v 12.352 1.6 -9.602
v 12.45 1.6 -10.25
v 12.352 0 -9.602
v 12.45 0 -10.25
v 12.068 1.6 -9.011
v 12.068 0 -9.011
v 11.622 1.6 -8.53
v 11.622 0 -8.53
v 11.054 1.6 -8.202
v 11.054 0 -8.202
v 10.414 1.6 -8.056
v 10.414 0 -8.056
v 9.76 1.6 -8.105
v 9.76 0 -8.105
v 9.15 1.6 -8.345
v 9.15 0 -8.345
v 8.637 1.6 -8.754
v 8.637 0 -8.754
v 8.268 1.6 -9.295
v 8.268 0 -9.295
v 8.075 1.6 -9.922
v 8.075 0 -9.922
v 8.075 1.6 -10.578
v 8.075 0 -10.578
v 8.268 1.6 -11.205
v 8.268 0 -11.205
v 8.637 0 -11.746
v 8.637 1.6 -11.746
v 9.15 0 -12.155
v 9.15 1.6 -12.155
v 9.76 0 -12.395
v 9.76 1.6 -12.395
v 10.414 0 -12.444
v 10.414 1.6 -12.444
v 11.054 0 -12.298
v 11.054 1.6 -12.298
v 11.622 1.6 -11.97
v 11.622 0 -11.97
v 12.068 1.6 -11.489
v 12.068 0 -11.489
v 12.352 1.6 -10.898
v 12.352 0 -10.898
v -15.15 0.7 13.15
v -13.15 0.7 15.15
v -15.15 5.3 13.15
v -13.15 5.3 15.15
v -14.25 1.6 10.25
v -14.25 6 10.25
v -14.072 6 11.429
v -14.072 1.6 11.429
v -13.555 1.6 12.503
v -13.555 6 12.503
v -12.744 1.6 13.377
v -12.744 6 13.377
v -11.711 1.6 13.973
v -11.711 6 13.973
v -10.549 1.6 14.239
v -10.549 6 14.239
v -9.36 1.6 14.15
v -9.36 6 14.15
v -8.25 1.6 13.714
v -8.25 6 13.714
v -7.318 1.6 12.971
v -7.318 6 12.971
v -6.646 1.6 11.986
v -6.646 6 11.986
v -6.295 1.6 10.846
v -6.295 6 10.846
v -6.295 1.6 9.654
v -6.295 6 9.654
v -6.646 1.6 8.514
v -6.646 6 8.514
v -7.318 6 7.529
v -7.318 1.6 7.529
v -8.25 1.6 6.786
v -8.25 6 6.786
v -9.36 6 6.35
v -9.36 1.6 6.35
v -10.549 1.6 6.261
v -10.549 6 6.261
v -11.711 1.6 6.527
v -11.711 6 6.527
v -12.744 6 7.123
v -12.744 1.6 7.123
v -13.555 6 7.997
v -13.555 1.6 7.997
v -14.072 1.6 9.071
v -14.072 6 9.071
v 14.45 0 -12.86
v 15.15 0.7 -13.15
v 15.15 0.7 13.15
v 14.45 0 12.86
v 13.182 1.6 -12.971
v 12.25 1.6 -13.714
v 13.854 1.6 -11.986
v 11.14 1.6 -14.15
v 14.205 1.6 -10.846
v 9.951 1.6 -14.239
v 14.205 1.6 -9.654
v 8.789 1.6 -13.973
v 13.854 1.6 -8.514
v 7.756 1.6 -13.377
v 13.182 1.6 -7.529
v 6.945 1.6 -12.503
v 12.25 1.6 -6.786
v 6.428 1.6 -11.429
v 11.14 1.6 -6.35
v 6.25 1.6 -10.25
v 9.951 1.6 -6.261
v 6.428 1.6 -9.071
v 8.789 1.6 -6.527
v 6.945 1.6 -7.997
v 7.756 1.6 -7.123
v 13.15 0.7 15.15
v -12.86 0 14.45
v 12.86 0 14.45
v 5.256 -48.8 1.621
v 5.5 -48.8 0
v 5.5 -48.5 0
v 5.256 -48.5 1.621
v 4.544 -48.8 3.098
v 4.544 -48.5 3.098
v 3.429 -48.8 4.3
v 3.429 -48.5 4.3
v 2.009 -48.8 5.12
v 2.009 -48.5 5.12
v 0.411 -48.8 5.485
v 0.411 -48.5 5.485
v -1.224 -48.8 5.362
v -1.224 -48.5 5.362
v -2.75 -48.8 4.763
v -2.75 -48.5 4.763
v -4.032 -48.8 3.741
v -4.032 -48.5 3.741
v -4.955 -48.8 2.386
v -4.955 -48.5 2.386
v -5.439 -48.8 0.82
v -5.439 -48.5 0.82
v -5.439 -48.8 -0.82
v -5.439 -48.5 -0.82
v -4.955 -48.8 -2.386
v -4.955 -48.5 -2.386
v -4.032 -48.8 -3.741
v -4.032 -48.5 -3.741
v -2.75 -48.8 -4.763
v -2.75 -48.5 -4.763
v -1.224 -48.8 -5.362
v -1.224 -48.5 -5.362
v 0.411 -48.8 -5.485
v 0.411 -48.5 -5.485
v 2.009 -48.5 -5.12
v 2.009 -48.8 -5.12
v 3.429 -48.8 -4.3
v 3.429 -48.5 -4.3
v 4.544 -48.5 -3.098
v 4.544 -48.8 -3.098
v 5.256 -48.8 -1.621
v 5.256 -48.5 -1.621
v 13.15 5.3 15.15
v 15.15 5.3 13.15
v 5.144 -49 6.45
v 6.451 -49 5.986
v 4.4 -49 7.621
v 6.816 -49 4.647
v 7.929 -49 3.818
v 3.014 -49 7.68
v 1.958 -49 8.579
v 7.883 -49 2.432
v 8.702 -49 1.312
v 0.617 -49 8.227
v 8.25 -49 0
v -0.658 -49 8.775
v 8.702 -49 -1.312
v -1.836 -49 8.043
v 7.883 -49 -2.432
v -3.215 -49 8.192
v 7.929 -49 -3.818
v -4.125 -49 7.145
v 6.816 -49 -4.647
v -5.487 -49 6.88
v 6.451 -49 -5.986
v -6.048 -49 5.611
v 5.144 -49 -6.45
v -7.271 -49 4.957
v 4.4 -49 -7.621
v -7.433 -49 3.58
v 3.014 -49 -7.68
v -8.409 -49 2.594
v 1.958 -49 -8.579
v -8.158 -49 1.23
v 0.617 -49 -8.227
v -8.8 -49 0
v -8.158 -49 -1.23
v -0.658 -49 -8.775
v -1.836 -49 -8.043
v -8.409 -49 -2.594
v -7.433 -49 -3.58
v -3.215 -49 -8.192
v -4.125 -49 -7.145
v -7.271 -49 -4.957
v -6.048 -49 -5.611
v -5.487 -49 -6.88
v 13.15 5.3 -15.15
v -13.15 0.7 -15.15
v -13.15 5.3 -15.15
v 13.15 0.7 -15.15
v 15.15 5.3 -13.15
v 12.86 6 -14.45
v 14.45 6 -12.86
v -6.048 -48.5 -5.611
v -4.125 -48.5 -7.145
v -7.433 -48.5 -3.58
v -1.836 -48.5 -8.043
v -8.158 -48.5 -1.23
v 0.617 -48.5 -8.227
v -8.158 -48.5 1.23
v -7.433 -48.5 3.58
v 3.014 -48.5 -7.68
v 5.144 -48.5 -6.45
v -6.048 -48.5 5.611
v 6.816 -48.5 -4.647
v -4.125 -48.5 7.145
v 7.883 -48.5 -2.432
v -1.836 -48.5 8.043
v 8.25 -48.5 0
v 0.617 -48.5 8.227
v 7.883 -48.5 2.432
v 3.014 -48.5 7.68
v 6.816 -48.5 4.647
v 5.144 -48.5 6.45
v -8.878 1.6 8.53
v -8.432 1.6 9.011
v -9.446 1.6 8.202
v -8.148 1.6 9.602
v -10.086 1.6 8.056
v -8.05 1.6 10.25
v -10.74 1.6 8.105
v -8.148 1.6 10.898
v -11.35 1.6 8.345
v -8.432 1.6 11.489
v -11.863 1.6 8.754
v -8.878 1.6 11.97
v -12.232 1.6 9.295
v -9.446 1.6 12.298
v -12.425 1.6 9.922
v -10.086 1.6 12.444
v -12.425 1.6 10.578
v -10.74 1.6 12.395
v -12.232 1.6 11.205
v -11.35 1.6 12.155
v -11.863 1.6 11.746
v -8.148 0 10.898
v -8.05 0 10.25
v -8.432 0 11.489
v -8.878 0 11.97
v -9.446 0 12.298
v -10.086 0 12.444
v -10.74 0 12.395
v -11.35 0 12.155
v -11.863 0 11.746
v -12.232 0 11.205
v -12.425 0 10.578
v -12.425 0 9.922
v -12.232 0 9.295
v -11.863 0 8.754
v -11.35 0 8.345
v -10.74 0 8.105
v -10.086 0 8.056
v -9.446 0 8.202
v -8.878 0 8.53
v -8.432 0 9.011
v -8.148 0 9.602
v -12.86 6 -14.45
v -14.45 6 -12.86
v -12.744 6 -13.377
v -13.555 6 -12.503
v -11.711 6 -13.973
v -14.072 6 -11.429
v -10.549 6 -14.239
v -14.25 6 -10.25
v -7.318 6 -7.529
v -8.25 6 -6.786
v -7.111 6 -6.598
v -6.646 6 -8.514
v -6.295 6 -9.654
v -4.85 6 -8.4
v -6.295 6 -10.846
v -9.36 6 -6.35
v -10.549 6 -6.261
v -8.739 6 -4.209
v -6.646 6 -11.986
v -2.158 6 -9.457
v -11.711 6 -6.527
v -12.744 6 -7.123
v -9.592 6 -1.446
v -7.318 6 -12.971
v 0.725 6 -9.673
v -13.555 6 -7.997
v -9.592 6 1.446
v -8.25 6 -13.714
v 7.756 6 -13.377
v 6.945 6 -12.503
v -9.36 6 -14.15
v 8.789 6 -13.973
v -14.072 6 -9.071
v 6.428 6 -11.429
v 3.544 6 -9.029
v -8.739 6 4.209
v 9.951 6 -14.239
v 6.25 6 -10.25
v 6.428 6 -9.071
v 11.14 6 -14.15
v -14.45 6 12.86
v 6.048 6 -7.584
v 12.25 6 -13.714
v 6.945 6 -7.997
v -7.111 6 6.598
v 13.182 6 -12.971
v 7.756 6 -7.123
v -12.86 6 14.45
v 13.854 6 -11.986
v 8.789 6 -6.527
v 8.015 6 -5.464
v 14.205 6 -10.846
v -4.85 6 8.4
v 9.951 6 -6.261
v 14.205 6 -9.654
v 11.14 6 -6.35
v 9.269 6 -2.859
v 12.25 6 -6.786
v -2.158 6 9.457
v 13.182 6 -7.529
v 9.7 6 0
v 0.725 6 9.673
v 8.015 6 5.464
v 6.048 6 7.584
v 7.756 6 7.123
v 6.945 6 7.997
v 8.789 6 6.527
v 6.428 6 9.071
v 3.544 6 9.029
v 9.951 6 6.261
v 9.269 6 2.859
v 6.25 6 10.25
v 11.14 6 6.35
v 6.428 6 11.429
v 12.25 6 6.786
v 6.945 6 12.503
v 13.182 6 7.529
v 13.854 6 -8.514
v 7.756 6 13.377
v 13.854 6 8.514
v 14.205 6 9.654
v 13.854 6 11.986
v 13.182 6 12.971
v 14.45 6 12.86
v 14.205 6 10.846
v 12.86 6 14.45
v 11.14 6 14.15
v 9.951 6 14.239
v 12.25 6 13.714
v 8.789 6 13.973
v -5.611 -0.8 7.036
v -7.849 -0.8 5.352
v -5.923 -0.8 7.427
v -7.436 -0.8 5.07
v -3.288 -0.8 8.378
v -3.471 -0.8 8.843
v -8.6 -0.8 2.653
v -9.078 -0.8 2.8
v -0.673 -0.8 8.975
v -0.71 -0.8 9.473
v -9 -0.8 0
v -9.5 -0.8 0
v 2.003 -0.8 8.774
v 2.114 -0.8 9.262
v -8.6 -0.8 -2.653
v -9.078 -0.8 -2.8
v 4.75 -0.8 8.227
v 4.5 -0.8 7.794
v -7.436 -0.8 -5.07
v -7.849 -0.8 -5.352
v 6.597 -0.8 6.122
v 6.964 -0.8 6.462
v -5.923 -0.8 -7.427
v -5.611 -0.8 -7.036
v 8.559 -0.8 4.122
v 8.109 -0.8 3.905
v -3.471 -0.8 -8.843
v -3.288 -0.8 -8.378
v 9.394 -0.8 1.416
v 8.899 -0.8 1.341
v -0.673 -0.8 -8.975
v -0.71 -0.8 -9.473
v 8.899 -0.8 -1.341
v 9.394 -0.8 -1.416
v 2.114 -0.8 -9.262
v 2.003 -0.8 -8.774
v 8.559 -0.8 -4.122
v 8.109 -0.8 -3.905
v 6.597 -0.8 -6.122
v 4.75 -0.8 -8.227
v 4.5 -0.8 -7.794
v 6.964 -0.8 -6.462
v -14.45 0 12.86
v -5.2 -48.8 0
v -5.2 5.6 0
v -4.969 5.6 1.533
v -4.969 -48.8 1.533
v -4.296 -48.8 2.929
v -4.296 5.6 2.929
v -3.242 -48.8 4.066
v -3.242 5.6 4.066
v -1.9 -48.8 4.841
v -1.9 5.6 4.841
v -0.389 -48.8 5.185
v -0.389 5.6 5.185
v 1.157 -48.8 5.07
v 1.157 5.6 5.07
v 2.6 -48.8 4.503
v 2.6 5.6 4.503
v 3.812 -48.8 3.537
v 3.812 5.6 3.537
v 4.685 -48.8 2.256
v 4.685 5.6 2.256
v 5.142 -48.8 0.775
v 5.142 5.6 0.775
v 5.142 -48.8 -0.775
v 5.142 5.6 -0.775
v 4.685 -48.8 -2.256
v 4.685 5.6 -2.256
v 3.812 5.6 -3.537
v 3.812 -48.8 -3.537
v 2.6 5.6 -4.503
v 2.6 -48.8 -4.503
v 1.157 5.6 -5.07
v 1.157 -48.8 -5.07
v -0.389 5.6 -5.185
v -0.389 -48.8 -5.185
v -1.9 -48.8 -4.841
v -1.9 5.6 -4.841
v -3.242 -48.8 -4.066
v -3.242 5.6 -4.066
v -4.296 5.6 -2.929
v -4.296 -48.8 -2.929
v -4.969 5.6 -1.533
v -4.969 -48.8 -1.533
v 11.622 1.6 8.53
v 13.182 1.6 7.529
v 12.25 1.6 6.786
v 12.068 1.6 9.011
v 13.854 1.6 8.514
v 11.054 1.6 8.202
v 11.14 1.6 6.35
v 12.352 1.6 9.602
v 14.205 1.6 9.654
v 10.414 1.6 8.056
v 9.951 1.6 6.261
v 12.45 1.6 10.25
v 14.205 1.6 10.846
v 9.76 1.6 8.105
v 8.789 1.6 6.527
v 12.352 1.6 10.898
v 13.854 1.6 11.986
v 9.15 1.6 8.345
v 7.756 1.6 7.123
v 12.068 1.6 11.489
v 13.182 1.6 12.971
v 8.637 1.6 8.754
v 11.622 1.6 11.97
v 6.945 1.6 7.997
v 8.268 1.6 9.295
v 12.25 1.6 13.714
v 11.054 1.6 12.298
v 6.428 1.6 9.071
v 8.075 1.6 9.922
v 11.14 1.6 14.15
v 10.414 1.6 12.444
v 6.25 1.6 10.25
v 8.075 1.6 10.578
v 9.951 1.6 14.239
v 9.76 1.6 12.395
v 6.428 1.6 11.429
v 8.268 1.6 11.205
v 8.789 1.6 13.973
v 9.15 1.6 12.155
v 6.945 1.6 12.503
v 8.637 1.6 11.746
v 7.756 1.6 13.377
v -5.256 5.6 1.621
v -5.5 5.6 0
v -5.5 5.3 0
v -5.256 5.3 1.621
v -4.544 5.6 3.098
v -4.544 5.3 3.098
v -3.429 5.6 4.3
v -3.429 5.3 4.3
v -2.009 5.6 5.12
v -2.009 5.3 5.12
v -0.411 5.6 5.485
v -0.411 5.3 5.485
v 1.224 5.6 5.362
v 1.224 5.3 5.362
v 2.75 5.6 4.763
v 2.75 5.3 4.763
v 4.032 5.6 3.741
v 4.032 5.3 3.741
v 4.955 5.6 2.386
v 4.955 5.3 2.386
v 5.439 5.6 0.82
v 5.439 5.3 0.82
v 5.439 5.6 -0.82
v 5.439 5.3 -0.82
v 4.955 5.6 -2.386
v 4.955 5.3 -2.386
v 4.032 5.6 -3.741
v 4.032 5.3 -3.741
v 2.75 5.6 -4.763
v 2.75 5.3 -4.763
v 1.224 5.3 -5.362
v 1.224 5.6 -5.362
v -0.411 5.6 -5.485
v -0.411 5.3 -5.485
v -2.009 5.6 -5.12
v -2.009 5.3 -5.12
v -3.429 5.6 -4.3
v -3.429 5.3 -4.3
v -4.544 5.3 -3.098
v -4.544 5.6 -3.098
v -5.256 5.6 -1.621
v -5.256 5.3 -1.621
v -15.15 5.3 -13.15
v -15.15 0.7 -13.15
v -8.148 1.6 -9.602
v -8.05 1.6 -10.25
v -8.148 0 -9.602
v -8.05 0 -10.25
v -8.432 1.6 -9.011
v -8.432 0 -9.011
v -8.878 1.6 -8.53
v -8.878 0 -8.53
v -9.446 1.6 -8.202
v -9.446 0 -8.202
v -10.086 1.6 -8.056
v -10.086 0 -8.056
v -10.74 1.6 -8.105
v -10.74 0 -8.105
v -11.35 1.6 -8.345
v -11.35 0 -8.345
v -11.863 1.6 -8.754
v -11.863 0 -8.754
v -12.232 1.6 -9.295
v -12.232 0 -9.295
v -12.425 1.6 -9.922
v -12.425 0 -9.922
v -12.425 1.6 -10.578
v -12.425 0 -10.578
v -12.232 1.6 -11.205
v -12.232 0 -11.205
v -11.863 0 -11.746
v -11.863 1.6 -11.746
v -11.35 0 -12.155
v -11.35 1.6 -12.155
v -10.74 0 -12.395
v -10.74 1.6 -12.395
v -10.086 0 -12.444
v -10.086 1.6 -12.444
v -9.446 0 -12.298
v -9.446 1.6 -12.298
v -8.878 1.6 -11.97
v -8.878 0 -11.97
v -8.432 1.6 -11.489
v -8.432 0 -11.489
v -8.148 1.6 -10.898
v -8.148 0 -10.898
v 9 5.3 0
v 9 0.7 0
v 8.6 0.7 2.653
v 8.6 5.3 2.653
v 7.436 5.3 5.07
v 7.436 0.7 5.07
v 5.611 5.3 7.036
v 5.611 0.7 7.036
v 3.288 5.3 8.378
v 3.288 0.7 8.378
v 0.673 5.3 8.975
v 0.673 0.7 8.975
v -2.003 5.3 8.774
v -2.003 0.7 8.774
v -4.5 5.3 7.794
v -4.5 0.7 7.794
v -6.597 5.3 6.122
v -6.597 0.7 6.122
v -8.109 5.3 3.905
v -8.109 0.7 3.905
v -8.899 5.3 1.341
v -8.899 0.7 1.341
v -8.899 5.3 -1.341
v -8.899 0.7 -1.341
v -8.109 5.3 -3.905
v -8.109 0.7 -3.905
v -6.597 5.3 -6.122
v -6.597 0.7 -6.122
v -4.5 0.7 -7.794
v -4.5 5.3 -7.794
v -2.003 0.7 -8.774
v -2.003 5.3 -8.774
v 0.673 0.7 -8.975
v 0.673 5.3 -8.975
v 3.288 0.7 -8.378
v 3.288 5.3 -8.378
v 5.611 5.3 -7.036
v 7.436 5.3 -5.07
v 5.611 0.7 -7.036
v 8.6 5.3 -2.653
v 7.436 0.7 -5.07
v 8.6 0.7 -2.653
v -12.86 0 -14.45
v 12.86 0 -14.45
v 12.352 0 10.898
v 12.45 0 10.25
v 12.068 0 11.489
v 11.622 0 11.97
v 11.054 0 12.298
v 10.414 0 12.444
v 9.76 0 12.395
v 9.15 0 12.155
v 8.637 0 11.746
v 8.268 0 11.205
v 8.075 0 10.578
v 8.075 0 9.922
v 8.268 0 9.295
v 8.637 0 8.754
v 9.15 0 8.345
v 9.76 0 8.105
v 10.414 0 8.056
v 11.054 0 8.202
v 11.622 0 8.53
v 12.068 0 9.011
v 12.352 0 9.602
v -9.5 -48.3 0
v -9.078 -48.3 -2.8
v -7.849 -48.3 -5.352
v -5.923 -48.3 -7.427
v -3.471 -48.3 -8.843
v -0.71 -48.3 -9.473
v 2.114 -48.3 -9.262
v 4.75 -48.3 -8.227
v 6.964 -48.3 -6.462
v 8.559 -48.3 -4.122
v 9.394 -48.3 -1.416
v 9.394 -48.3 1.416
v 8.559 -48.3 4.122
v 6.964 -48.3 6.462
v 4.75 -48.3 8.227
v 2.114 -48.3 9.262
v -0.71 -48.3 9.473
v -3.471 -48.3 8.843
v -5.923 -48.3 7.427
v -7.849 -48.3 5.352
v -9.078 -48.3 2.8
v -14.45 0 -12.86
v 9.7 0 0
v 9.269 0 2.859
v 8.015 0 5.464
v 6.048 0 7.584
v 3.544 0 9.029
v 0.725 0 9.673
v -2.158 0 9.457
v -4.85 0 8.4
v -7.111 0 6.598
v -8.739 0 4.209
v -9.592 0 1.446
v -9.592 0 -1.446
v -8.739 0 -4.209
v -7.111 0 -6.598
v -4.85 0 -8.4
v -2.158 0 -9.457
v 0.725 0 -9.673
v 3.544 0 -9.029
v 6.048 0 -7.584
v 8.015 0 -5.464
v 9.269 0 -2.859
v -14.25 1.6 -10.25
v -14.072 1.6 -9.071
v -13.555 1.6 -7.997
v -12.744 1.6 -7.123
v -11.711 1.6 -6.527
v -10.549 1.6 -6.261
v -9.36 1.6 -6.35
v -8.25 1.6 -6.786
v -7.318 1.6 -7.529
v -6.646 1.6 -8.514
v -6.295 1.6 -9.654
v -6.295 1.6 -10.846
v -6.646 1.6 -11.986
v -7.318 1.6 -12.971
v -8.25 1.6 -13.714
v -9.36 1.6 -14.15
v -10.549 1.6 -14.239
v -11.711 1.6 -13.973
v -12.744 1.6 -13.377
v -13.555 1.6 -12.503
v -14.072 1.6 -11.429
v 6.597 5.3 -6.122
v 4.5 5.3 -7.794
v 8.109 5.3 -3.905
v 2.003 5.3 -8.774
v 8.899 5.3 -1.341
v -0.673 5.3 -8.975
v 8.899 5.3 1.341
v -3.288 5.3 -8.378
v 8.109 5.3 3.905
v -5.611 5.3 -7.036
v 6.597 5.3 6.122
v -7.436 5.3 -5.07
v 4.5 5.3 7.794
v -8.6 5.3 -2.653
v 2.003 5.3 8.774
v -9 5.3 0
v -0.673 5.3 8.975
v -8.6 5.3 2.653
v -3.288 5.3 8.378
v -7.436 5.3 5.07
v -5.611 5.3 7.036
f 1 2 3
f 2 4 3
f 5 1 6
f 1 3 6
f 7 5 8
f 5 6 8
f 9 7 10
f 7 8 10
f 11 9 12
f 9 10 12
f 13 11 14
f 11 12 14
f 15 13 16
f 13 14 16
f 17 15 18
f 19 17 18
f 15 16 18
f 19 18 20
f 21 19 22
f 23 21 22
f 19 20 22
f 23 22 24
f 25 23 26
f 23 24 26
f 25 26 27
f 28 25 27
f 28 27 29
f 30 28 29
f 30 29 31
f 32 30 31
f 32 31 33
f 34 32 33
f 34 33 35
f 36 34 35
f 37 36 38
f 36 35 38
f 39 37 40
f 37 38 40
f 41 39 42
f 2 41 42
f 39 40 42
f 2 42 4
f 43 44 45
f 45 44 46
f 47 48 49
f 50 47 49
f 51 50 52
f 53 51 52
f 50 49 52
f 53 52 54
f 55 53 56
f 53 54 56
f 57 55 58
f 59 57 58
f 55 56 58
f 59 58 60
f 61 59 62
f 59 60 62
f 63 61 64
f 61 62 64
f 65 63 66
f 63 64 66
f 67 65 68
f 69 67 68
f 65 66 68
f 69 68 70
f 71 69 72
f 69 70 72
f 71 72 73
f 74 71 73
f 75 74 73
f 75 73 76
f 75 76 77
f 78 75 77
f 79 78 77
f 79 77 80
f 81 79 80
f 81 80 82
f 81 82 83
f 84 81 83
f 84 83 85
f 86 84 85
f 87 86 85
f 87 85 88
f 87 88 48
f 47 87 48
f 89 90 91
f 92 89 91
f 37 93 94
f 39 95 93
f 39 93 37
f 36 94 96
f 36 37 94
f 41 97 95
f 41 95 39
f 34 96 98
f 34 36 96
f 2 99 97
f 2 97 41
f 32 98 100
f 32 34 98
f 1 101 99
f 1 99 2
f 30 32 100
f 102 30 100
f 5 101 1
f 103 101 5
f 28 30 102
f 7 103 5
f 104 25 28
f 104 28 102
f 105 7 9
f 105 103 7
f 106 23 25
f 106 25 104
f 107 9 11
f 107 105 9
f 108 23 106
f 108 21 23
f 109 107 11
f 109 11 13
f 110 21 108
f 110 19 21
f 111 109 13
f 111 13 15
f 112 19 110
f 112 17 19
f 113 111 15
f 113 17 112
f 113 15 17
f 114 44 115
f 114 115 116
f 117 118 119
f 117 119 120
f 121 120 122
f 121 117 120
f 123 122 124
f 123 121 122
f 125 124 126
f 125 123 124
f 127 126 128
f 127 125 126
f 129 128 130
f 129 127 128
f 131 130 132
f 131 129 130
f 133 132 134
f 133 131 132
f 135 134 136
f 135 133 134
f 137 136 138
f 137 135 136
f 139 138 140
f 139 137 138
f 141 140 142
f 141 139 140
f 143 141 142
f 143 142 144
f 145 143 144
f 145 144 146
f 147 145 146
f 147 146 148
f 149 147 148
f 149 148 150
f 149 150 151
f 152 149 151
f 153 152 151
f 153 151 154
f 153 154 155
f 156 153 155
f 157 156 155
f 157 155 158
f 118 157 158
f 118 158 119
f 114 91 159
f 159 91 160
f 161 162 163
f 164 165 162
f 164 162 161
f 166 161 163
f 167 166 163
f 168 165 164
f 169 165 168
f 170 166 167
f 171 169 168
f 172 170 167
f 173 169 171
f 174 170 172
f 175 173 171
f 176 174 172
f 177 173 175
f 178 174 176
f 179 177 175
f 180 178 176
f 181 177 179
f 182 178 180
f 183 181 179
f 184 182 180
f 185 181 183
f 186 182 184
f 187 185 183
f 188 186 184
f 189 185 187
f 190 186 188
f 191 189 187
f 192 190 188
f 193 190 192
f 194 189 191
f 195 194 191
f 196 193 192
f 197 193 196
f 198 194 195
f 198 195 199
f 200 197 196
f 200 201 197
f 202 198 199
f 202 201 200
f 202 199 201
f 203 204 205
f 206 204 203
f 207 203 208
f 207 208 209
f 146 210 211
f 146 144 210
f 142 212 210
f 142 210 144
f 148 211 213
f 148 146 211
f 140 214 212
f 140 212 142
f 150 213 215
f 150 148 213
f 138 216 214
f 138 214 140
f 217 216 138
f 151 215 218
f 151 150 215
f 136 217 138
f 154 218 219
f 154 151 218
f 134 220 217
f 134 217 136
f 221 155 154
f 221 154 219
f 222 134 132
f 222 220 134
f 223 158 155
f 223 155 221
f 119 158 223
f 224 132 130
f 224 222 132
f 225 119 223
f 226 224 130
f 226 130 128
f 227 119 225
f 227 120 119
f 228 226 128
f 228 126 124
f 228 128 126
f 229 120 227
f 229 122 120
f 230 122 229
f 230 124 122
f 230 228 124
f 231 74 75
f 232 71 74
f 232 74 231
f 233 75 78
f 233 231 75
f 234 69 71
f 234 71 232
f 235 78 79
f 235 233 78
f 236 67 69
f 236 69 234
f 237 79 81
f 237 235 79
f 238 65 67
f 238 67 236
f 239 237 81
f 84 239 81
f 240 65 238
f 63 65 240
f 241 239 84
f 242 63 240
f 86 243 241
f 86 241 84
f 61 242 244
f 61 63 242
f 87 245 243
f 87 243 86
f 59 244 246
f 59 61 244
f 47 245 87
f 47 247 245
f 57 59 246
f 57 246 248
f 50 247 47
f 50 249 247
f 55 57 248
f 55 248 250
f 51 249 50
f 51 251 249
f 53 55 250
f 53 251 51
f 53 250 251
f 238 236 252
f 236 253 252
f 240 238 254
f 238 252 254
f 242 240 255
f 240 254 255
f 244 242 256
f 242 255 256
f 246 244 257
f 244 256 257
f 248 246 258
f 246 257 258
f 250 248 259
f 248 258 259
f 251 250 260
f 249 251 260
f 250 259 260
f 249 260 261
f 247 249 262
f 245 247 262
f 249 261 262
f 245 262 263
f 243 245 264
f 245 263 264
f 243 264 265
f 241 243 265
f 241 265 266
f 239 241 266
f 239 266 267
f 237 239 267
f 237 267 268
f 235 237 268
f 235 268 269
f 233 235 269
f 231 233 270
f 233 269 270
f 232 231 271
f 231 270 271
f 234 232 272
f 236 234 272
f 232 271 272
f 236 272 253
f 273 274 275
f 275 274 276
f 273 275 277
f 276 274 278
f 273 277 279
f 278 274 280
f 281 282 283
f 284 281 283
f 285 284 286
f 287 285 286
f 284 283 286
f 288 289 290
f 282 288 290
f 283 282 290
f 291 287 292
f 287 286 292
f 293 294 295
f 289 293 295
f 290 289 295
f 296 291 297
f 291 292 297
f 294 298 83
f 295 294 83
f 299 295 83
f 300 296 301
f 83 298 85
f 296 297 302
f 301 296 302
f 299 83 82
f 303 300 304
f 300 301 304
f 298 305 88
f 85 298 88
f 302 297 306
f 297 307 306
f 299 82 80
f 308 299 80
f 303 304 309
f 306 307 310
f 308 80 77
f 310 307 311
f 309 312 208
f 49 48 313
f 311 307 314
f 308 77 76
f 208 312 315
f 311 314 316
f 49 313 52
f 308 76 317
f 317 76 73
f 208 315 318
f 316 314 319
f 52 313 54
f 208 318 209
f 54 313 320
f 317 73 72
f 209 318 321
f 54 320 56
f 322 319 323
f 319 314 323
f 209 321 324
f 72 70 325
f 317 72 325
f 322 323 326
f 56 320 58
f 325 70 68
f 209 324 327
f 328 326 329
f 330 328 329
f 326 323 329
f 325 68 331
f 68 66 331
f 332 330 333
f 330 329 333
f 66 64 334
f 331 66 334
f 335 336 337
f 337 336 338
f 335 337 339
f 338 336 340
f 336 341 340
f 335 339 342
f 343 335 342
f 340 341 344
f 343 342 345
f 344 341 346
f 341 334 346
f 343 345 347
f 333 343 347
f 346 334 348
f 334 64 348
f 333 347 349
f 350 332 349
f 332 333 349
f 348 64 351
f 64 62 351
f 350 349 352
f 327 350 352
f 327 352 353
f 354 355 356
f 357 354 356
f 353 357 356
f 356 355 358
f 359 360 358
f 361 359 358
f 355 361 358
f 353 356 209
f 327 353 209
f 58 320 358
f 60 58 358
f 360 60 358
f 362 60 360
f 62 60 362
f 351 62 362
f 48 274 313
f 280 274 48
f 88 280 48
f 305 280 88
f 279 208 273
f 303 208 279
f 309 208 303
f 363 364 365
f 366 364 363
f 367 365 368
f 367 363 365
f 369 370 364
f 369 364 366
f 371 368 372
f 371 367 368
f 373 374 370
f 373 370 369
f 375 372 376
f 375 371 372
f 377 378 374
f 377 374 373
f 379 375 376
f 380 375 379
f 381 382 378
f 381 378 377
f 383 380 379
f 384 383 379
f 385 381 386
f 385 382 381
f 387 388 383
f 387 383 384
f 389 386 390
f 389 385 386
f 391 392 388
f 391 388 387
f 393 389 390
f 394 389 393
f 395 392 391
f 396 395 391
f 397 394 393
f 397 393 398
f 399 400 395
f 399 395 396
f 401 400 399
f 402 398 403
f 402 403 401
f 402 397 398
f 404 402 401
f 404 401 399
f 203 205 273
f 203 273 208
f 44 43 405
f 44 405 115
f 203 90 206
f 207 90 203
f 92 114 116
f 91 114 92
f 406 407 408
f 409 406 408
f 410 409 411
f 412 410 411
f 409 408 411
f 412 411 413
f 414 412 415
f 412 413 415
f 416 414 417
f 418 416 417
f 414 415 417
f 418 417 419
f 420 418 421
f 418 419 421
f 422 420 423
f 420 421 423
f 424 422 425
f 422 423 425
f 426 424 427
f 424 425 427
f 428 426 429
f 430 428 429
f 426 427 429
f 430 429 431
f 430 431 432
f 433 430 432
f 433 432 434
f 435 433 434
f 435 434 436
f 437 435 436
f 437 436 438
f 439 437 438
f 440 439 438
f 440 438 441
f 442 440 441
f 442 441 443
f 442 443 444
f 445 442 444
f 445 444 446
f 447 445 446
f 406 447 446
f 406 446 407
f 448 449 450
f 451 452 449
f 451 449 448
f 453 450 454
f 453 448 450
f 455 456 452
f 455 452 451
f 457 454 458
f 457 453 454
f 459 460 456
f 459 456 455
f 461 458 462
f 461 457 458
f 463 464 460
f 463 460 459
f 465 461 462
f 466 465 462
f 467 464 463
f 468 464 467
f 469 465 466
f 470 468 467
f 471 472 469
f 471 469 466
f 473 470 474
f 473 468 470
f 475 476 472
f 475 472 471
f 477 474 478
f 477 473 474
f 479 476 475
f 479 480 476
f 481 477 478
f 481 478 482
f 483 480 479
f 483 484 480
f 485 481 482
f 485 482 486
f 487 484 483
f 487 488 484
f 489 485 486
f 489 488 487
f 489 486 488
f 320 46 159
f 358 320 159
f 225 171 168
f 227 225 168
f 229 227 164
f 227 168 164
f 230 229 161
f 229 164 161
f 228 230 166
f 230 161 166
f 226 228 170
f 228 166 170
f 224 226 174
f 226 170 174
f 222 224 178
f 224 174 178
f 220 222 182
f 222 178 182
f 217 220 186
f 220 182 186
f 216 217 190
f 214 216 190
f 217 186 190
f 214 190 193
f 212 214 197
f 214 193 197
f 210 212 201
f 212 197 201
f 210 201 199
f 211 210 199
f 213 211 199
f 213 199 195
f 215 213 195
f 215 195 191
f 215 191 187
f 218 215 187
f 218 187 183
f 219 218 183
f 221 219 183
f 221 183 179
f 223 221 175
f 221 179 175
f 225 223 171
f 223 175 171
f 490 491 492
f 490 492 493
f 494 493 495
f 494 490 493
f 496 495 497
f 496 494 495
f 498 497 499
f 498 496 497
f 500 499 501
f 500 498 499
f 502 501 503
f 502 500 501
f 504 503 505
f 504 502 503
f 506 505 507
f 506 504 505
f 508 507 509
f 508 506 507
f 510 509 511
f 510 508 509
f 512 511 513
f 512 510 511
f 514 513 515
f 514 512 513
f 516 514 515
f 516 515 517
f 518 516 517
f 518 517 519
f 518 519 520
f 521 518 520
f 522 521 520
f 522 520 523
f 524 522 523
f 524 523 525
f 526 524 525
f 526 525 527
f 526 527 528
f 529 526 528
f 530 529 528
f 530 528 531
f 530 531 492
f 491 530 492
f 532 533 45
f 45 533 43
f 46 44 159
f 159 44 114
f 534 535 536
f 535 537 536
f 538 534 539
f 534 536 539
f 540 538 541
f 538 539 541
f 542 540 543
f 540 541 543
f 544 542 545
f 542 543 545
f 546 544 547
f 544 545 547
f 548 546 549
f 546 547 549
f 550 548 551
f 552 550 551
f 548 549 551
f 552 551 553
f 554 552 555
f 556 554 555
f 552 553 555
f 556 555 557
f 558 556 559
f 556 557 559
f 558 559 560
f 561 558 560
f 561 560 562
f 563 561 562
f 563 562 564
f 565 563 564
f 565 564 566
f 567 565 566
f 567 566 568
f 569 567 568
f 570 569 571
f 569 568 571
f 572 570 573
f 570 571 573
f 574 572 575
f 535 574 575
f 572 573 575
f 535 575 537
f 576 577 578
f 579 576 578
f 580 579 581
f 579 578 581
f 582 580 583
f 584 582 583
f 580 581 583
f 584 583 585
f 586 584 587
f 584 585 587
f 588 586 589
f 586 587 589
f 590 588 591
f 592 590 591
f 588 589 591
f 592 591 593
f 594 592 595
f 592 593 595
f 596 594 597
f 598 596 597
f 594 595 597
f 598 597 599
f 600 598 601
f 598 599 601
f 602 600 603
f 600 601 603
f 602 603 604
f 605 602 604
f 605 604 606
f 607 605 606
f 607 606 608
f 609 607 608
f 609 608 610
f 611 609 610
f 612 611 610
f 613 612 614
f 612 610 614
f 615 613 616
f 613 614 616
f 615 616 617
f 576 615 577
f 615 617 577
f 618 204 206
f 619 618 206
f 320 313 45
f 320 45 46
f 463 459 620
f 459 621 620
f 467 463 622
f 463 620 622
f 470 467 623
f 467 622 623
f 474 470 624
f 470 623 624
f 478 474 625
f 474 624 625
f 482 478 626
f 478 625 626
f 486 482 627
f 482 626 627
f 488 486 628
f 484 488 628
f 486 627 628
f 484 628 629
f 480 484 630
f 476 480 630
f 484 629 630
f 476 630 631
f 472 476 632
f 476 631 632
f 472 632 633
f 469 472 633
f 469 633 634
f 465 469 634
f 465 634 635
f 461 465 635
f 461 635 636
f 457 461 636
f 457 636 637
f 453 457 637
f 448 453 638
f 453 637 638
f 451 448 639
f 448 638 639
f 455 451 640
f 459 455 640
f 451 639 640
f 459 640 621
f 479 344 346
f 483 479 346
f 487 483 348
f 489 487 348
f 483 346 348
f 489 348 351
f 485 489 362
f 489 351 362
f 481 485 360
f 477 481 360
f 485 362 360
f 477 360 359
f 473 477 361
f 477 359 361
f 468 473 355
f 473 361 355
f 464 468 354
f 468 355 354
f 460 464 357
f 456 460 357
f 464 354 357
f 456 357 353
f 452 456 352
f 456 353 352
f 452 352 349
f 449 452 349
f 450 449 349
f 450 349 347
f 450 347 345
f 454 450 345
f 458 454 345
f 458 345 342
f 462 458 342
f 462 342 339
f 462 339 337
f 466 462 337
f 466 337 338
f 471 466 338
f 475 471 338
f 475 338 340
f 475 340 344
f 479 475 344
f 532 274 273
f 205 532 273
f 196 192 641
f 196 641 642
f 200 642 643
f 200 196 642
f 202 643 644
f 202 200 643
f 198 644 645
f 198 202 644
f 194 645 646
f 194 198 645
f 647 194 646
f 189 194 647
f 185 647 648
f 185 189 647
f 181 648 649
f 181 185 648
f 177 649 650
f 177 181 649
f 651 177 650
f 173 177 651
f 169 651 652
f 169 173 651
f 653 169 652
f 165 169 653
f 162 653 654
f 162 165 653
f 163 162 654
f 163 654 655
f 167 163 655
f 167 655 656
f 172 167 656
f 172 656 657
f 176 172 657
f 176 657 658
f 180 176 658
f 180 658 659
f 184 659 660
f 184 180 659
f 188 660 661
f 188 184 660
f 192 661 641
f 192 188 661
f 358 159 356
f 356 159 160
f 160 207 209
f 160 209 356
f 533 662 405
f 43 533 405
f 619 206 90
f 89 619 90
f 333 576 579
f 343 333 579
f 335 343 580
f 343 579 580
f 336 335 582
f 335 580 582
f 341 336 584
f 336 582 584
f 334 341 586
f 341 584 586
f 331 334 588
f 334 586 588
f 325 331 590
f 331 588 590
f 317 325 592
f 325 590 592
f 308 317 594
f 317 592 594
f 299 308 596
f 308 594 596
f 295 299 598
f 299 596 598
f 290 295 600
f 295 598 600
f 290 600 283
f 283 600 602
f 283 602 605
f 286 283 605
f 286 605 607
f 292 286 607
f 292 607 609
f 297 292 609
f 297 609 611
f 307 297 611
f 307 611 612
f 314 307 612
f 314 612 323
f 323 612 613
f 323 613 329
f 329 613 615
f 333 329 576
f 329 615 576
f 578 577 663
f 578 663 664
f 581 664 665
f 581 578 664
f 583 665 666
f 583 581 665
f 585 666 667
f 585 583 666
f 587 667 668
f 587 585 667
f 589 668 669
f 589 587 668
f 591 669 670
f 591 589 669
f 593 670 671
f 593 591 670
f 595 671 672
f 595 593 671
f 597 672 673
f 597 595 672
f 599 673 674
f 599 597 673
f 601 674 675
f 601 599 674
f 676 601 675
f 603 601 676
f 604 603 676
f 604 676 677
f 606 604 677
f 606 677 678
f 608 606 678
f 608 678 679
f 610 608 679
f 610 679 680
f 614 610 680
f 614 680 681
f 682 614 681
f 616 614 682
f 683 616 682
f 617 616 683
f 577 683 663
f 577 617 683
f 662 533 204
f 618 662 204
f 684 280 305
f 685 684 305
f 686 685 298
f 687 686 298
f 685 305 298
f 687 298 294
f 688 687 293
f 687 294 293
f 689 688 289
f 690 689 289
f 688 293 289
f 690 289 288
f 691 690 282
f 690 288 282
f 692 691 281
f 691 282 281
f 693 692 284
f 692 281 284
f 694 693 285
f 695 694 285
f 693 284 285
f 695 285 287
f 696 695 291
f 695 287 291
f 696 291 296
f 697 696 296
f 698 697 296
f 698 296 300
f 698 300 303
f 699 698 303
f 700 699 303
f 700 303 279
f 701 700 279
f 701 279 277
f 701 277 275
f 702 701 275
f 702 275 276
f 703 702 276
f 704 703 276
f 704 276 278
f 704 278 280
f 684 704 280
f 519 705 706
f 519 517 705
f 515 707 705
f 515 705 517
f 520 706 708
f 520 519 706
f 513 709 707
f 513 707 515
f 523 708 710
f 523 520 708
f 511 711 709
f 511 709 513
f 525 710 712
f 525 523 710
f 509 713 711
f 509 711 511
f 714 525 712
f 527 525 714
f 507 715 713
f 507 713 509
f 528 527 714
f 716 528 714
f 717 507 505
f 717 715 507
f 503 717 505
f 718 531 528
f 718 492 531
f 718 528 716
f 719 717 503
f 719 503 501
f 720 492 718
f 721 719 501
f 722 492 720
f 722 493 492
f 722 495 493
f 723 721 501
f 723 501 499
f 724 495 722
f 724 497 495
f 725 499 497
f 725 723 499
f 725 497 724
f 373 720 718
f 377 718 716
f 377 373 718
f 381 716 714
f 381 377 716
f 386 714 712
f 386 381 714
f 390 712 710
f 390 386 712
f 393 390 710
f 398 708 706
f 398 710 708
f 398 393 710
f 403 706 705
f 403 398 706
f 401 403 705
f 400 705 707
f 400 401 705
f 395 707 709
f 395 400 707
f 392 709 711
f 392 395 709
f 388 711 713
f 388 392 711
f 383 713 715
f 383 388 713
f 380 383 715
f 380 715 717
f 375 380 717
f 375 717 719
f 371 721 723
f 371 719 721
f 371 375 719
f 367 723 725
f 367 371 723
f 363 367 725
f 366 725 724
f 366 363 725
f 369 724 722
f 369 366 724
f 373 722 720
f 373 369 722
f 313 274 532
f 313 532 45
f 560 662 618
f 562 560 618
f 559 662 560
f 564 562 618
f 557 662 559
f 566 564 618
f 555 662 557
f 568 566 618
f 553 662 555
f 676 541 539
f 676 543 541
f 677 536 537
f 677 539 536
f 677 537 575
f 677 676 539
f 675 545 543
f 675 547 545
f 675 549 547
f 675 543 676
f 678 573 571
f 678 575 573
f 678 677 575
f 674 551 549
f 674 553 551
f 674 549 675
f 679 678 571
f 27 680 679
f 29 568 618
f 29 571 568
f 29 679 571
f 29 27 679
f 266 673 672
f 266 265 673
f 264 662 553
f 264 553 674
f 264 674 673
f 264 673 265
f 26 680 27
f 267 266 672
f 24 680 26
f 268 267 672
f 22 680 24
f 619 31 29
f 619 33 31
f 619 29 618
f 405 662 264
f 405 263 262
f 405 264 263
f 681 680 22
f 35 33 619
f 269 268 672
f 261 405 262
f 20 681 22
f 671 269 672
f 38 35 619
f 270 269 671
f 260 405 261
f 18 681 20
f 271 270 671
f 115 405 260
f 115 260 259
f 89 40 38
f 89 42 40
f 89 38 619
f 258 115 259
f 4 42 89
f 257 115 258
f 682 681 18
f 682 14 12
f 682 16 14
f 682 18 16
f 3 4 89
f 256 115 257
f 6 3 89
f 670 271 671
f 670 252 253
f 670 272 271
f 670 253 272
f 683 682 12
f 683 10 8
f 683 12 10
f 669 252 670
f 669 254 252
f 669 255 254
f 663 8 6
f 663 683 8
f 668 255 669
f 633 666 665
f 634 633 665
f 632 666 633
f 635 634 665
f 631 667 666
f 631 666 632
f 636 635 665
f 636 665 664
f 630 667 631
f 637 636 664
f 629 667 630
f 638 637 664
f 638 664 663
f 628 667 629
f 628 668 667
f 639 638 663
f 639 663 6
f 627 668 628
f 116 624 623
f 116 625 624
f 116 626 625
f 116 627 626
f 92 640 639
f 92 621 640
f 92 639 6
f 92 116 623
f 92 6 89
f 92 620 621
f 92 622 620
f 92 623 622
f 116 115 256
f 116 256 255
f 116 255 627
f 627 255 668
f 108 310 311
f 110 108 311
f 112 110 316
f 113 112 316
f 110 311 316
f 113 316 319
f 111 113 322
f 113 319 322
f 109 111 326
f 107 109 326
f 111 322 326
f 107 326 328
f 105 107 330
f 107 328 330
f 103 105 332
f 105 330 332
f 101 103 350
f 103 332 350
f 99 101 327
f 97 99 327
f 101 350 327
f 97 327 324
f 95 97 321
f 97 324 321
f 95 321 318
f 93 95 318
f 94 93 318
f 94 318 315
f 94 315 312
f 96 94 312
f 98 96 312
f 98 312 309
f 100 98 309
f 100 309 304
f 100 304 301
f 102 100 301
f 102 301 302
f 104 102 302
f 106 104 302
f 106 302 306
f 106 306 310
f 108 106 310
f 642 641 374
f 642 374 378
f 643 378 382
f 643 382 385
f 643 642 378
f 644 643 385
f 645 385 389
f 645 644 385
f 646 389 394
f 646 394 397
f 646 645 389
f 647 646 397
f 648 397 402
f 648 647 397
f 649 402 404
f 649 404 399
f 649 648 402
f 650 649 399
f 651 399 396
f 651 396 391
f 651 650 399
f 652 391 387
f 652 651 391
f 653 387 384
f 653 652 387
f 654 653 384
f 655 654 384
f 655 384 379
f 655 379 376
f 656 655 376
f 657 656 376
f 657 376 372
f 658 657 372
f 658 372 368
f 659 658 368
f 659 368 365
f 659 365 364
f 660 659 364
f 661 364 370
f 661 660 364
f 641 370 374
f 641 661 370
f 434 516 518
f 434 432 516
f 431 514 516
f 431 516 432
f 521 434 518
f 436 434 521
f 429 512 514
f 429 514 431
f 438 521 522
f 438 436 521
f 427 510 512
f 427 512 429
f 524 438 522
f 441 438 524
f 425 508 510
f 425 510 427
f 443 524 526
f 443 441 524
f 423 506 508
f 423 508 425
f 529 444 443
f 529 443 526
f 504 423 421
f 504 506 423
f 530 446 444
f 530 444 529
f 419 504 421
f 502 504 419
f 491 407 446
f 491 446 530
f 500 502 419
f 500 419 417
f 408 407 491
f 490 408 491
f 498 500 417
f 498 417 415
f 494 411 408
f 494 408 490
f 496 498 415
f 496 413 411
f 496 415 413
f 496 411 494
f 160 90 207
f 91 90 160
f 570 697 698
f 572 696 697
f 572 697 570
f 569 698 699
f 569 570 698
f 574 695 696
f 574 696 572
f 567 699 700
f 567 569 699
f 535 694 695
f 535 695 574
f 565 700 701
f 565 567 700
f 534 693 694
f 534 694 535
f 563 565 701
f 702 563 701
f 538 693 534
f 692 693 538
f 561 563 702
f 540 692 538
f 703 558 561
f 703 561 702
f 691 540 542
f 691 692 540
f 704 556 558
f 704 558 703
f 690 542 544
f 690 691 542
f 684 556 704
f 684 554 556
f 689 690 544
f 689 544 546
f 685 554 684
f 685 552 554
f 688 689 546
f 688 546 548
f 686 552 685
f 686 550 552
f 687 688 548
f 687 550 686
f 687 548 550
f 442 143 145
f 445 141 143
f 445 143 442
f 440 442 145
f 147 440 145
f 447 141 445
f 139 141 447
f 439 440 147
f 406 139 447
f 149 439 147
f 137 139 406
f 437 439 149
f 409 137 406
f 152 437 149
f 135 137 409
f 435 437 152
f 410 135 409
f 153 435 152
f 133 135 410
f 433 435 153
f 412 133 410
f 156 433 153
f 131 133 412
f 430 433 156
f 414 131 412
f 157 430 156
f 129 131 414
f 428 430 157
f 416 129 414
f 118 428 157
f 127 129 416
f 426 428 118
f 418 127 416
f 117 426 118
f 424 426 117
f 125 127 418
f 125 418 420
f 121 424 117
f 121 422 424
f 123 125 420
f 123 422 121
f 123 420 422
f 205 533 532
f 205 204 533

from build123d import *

# Parameters (mm, degrees)
F0_W           = 30.3
F0_H           = 30.3
F0_R           = 9
F1_DEPTH       = 6
F3_SIZE        = 2
F5_SIZE        = 0.7
F5_2_SIZE      = 0.7
F7_D           = 4.4
F7_CBORE_D     = 8
F7_CBORE_DEPTH = 4.4
F9_R           = 9
F9_R_2         = 5.5
F10_DEPTH      = 0.7
F9_R_3         = 5.2
F11_DEPTH      = 0.4
F12_DEPTH      = 55
F13_R          = 8.25
F13_R_2        = 5.5
F14_DEPTH      = 0.5
F13_R_3        = 5.2
F15_DEPTH      = 0.2


# Not quite as in the source:
# - two fillets or chamfers of one size are made in one step


with BuildPart() as f1:
    # F0 (on Front) → F1 (new body)
    with BuildSketch(Plane.XZ):
        Rectangle(F0_W, F0_H)
        Circle(F0_R, mode=Mode.SUBTRACT)
    extrude(amount=-F1_DEPTH)

    # F3
    f3_edges = [f1.edges().sort_by_distance(p)[0] for p in [
        (15.15, 3, 15.15),
        (-15.15, 3, 15.15),
        (15.15, 3, -15.15),
        (-15.15, 3, -15.15),
    ]]
    chamfer(f3_edges, length=F3_SIZE)

    # F5
    f5_edges = [f1.edges().sort_by_distance(p)[0] for p in [
        (9, 3, 0),
        (-9, 0, 0),
        (-9, 6, 0),
        (0, 0, 15.15),
        (-14.15, 0, 14.15),
        (-15.15, 0, 0),
        (-14.15, 0, -14.15),
        (0, 0, -15.15),
        (14.15, 0, -14.15),
        (15.15, 0, 0),
        (14.15, 0, 14.15),
        (15.15, 6, 0),
        (14.15, 6, 14.15),
        (0, 6, 15.15),
        (-14.15, 6, 14.15),
        (-15.15, 6, 0),
        (-14.15, 6, -14.15),
        (0, 6, -15.15),
        (14.15, 6, -14.15),
    ]]
    chamfer(f5_edges, length=F5_SIZE)

    # F7 (through all)
    with Locations(Plane(origin=(0, 6, 0), x_dir=(-1, 0, 0), z_dir=(0, 1, 0))):
        with Locations((-10.25, 10.25), (10.25, 10.25), (10.25, -10.25), (-10.25, -10.25)):
            CounterBoreHole(F7_D / 2, F7_CBORE_D / 2, F7_CBORE_DEPTH)


with BuildPart() as f4:
    # F2 (on Top) → F4 (revolve)
    with BuildSketch(Plane.XY):
        Polygon((0, -49), (0, 6), (-9, 6), (-9, -0.8), (-9.5, -0.8), (-9.5, -49), align=None)
    revolve(axis=Axis((0, 15.3594217002, 0), (0, -1, 0)))

    # F5#2
    f5_2_edges = [f4.edges().sort_by_distance(p)[0] for p in [
        (9.5, -49, 0),
    ]]
    chamfer(f5_2_edges, length=F5_2_SIZE)

    # F9 (on face) → F10 (cut)
    with BuildSketch(Plane(origin=(0, 6, 0), x_dir=(-1, 0, 0), z_dir=(0, 1, 0))):
        Circle(F9_R)
        Circle(F9_R_2, mode=Mode.SUBTRACT)
    extrude(amount=-F10_DEPTH, mode=Mode.SUBTRACT)

    # F9 (on face) → F11 (cut)
    with BuildSketch(Plane(origin=(0, 6, 0), x_dir=(-1, 0, 0), z_dir=(0, 1, 0))):
        Circle(F9_R_2)
        Circle(F9_R_3, mode=Mode.SUBTRACT)
    extrude(amount=-F11_DEPTH, mode=Mode.SUBTRACT)

    # F9 (on face) → F12 (cut, through all)
    with BuildSketch(Plane(origin=(0, 6, 0), x_dir=(-1, 0, 0), z_dir=(0, 1, 0))):
        Circle(F9_R_3)
    extrude(amount=-F12_DEPTH, mode=Mode.SUBTRACT)

    # F13 (on face) → F14 (cut)
    with BuildSketch(Plane.XZ.offset(49)):
        Circle(F13_R)
        Circle(F13_R_2, mode=Mode.SUBTRACT)
    extrude(amount=-F14_DEPTH, mode=Mode.SUBTRACT)

    # F13 (on face) → F15 (cut)
    with BuildSketch(Plane.XZ.offset(49)):
        Circle(F13_R_2)
        Circle(F13_R_3, mode=Mode.SUBTRACT)
    extrude(amount=-F15_DEPTH, mode=Mode.SUBTRACT)


solid = Compound([f1.part, f4.part])
